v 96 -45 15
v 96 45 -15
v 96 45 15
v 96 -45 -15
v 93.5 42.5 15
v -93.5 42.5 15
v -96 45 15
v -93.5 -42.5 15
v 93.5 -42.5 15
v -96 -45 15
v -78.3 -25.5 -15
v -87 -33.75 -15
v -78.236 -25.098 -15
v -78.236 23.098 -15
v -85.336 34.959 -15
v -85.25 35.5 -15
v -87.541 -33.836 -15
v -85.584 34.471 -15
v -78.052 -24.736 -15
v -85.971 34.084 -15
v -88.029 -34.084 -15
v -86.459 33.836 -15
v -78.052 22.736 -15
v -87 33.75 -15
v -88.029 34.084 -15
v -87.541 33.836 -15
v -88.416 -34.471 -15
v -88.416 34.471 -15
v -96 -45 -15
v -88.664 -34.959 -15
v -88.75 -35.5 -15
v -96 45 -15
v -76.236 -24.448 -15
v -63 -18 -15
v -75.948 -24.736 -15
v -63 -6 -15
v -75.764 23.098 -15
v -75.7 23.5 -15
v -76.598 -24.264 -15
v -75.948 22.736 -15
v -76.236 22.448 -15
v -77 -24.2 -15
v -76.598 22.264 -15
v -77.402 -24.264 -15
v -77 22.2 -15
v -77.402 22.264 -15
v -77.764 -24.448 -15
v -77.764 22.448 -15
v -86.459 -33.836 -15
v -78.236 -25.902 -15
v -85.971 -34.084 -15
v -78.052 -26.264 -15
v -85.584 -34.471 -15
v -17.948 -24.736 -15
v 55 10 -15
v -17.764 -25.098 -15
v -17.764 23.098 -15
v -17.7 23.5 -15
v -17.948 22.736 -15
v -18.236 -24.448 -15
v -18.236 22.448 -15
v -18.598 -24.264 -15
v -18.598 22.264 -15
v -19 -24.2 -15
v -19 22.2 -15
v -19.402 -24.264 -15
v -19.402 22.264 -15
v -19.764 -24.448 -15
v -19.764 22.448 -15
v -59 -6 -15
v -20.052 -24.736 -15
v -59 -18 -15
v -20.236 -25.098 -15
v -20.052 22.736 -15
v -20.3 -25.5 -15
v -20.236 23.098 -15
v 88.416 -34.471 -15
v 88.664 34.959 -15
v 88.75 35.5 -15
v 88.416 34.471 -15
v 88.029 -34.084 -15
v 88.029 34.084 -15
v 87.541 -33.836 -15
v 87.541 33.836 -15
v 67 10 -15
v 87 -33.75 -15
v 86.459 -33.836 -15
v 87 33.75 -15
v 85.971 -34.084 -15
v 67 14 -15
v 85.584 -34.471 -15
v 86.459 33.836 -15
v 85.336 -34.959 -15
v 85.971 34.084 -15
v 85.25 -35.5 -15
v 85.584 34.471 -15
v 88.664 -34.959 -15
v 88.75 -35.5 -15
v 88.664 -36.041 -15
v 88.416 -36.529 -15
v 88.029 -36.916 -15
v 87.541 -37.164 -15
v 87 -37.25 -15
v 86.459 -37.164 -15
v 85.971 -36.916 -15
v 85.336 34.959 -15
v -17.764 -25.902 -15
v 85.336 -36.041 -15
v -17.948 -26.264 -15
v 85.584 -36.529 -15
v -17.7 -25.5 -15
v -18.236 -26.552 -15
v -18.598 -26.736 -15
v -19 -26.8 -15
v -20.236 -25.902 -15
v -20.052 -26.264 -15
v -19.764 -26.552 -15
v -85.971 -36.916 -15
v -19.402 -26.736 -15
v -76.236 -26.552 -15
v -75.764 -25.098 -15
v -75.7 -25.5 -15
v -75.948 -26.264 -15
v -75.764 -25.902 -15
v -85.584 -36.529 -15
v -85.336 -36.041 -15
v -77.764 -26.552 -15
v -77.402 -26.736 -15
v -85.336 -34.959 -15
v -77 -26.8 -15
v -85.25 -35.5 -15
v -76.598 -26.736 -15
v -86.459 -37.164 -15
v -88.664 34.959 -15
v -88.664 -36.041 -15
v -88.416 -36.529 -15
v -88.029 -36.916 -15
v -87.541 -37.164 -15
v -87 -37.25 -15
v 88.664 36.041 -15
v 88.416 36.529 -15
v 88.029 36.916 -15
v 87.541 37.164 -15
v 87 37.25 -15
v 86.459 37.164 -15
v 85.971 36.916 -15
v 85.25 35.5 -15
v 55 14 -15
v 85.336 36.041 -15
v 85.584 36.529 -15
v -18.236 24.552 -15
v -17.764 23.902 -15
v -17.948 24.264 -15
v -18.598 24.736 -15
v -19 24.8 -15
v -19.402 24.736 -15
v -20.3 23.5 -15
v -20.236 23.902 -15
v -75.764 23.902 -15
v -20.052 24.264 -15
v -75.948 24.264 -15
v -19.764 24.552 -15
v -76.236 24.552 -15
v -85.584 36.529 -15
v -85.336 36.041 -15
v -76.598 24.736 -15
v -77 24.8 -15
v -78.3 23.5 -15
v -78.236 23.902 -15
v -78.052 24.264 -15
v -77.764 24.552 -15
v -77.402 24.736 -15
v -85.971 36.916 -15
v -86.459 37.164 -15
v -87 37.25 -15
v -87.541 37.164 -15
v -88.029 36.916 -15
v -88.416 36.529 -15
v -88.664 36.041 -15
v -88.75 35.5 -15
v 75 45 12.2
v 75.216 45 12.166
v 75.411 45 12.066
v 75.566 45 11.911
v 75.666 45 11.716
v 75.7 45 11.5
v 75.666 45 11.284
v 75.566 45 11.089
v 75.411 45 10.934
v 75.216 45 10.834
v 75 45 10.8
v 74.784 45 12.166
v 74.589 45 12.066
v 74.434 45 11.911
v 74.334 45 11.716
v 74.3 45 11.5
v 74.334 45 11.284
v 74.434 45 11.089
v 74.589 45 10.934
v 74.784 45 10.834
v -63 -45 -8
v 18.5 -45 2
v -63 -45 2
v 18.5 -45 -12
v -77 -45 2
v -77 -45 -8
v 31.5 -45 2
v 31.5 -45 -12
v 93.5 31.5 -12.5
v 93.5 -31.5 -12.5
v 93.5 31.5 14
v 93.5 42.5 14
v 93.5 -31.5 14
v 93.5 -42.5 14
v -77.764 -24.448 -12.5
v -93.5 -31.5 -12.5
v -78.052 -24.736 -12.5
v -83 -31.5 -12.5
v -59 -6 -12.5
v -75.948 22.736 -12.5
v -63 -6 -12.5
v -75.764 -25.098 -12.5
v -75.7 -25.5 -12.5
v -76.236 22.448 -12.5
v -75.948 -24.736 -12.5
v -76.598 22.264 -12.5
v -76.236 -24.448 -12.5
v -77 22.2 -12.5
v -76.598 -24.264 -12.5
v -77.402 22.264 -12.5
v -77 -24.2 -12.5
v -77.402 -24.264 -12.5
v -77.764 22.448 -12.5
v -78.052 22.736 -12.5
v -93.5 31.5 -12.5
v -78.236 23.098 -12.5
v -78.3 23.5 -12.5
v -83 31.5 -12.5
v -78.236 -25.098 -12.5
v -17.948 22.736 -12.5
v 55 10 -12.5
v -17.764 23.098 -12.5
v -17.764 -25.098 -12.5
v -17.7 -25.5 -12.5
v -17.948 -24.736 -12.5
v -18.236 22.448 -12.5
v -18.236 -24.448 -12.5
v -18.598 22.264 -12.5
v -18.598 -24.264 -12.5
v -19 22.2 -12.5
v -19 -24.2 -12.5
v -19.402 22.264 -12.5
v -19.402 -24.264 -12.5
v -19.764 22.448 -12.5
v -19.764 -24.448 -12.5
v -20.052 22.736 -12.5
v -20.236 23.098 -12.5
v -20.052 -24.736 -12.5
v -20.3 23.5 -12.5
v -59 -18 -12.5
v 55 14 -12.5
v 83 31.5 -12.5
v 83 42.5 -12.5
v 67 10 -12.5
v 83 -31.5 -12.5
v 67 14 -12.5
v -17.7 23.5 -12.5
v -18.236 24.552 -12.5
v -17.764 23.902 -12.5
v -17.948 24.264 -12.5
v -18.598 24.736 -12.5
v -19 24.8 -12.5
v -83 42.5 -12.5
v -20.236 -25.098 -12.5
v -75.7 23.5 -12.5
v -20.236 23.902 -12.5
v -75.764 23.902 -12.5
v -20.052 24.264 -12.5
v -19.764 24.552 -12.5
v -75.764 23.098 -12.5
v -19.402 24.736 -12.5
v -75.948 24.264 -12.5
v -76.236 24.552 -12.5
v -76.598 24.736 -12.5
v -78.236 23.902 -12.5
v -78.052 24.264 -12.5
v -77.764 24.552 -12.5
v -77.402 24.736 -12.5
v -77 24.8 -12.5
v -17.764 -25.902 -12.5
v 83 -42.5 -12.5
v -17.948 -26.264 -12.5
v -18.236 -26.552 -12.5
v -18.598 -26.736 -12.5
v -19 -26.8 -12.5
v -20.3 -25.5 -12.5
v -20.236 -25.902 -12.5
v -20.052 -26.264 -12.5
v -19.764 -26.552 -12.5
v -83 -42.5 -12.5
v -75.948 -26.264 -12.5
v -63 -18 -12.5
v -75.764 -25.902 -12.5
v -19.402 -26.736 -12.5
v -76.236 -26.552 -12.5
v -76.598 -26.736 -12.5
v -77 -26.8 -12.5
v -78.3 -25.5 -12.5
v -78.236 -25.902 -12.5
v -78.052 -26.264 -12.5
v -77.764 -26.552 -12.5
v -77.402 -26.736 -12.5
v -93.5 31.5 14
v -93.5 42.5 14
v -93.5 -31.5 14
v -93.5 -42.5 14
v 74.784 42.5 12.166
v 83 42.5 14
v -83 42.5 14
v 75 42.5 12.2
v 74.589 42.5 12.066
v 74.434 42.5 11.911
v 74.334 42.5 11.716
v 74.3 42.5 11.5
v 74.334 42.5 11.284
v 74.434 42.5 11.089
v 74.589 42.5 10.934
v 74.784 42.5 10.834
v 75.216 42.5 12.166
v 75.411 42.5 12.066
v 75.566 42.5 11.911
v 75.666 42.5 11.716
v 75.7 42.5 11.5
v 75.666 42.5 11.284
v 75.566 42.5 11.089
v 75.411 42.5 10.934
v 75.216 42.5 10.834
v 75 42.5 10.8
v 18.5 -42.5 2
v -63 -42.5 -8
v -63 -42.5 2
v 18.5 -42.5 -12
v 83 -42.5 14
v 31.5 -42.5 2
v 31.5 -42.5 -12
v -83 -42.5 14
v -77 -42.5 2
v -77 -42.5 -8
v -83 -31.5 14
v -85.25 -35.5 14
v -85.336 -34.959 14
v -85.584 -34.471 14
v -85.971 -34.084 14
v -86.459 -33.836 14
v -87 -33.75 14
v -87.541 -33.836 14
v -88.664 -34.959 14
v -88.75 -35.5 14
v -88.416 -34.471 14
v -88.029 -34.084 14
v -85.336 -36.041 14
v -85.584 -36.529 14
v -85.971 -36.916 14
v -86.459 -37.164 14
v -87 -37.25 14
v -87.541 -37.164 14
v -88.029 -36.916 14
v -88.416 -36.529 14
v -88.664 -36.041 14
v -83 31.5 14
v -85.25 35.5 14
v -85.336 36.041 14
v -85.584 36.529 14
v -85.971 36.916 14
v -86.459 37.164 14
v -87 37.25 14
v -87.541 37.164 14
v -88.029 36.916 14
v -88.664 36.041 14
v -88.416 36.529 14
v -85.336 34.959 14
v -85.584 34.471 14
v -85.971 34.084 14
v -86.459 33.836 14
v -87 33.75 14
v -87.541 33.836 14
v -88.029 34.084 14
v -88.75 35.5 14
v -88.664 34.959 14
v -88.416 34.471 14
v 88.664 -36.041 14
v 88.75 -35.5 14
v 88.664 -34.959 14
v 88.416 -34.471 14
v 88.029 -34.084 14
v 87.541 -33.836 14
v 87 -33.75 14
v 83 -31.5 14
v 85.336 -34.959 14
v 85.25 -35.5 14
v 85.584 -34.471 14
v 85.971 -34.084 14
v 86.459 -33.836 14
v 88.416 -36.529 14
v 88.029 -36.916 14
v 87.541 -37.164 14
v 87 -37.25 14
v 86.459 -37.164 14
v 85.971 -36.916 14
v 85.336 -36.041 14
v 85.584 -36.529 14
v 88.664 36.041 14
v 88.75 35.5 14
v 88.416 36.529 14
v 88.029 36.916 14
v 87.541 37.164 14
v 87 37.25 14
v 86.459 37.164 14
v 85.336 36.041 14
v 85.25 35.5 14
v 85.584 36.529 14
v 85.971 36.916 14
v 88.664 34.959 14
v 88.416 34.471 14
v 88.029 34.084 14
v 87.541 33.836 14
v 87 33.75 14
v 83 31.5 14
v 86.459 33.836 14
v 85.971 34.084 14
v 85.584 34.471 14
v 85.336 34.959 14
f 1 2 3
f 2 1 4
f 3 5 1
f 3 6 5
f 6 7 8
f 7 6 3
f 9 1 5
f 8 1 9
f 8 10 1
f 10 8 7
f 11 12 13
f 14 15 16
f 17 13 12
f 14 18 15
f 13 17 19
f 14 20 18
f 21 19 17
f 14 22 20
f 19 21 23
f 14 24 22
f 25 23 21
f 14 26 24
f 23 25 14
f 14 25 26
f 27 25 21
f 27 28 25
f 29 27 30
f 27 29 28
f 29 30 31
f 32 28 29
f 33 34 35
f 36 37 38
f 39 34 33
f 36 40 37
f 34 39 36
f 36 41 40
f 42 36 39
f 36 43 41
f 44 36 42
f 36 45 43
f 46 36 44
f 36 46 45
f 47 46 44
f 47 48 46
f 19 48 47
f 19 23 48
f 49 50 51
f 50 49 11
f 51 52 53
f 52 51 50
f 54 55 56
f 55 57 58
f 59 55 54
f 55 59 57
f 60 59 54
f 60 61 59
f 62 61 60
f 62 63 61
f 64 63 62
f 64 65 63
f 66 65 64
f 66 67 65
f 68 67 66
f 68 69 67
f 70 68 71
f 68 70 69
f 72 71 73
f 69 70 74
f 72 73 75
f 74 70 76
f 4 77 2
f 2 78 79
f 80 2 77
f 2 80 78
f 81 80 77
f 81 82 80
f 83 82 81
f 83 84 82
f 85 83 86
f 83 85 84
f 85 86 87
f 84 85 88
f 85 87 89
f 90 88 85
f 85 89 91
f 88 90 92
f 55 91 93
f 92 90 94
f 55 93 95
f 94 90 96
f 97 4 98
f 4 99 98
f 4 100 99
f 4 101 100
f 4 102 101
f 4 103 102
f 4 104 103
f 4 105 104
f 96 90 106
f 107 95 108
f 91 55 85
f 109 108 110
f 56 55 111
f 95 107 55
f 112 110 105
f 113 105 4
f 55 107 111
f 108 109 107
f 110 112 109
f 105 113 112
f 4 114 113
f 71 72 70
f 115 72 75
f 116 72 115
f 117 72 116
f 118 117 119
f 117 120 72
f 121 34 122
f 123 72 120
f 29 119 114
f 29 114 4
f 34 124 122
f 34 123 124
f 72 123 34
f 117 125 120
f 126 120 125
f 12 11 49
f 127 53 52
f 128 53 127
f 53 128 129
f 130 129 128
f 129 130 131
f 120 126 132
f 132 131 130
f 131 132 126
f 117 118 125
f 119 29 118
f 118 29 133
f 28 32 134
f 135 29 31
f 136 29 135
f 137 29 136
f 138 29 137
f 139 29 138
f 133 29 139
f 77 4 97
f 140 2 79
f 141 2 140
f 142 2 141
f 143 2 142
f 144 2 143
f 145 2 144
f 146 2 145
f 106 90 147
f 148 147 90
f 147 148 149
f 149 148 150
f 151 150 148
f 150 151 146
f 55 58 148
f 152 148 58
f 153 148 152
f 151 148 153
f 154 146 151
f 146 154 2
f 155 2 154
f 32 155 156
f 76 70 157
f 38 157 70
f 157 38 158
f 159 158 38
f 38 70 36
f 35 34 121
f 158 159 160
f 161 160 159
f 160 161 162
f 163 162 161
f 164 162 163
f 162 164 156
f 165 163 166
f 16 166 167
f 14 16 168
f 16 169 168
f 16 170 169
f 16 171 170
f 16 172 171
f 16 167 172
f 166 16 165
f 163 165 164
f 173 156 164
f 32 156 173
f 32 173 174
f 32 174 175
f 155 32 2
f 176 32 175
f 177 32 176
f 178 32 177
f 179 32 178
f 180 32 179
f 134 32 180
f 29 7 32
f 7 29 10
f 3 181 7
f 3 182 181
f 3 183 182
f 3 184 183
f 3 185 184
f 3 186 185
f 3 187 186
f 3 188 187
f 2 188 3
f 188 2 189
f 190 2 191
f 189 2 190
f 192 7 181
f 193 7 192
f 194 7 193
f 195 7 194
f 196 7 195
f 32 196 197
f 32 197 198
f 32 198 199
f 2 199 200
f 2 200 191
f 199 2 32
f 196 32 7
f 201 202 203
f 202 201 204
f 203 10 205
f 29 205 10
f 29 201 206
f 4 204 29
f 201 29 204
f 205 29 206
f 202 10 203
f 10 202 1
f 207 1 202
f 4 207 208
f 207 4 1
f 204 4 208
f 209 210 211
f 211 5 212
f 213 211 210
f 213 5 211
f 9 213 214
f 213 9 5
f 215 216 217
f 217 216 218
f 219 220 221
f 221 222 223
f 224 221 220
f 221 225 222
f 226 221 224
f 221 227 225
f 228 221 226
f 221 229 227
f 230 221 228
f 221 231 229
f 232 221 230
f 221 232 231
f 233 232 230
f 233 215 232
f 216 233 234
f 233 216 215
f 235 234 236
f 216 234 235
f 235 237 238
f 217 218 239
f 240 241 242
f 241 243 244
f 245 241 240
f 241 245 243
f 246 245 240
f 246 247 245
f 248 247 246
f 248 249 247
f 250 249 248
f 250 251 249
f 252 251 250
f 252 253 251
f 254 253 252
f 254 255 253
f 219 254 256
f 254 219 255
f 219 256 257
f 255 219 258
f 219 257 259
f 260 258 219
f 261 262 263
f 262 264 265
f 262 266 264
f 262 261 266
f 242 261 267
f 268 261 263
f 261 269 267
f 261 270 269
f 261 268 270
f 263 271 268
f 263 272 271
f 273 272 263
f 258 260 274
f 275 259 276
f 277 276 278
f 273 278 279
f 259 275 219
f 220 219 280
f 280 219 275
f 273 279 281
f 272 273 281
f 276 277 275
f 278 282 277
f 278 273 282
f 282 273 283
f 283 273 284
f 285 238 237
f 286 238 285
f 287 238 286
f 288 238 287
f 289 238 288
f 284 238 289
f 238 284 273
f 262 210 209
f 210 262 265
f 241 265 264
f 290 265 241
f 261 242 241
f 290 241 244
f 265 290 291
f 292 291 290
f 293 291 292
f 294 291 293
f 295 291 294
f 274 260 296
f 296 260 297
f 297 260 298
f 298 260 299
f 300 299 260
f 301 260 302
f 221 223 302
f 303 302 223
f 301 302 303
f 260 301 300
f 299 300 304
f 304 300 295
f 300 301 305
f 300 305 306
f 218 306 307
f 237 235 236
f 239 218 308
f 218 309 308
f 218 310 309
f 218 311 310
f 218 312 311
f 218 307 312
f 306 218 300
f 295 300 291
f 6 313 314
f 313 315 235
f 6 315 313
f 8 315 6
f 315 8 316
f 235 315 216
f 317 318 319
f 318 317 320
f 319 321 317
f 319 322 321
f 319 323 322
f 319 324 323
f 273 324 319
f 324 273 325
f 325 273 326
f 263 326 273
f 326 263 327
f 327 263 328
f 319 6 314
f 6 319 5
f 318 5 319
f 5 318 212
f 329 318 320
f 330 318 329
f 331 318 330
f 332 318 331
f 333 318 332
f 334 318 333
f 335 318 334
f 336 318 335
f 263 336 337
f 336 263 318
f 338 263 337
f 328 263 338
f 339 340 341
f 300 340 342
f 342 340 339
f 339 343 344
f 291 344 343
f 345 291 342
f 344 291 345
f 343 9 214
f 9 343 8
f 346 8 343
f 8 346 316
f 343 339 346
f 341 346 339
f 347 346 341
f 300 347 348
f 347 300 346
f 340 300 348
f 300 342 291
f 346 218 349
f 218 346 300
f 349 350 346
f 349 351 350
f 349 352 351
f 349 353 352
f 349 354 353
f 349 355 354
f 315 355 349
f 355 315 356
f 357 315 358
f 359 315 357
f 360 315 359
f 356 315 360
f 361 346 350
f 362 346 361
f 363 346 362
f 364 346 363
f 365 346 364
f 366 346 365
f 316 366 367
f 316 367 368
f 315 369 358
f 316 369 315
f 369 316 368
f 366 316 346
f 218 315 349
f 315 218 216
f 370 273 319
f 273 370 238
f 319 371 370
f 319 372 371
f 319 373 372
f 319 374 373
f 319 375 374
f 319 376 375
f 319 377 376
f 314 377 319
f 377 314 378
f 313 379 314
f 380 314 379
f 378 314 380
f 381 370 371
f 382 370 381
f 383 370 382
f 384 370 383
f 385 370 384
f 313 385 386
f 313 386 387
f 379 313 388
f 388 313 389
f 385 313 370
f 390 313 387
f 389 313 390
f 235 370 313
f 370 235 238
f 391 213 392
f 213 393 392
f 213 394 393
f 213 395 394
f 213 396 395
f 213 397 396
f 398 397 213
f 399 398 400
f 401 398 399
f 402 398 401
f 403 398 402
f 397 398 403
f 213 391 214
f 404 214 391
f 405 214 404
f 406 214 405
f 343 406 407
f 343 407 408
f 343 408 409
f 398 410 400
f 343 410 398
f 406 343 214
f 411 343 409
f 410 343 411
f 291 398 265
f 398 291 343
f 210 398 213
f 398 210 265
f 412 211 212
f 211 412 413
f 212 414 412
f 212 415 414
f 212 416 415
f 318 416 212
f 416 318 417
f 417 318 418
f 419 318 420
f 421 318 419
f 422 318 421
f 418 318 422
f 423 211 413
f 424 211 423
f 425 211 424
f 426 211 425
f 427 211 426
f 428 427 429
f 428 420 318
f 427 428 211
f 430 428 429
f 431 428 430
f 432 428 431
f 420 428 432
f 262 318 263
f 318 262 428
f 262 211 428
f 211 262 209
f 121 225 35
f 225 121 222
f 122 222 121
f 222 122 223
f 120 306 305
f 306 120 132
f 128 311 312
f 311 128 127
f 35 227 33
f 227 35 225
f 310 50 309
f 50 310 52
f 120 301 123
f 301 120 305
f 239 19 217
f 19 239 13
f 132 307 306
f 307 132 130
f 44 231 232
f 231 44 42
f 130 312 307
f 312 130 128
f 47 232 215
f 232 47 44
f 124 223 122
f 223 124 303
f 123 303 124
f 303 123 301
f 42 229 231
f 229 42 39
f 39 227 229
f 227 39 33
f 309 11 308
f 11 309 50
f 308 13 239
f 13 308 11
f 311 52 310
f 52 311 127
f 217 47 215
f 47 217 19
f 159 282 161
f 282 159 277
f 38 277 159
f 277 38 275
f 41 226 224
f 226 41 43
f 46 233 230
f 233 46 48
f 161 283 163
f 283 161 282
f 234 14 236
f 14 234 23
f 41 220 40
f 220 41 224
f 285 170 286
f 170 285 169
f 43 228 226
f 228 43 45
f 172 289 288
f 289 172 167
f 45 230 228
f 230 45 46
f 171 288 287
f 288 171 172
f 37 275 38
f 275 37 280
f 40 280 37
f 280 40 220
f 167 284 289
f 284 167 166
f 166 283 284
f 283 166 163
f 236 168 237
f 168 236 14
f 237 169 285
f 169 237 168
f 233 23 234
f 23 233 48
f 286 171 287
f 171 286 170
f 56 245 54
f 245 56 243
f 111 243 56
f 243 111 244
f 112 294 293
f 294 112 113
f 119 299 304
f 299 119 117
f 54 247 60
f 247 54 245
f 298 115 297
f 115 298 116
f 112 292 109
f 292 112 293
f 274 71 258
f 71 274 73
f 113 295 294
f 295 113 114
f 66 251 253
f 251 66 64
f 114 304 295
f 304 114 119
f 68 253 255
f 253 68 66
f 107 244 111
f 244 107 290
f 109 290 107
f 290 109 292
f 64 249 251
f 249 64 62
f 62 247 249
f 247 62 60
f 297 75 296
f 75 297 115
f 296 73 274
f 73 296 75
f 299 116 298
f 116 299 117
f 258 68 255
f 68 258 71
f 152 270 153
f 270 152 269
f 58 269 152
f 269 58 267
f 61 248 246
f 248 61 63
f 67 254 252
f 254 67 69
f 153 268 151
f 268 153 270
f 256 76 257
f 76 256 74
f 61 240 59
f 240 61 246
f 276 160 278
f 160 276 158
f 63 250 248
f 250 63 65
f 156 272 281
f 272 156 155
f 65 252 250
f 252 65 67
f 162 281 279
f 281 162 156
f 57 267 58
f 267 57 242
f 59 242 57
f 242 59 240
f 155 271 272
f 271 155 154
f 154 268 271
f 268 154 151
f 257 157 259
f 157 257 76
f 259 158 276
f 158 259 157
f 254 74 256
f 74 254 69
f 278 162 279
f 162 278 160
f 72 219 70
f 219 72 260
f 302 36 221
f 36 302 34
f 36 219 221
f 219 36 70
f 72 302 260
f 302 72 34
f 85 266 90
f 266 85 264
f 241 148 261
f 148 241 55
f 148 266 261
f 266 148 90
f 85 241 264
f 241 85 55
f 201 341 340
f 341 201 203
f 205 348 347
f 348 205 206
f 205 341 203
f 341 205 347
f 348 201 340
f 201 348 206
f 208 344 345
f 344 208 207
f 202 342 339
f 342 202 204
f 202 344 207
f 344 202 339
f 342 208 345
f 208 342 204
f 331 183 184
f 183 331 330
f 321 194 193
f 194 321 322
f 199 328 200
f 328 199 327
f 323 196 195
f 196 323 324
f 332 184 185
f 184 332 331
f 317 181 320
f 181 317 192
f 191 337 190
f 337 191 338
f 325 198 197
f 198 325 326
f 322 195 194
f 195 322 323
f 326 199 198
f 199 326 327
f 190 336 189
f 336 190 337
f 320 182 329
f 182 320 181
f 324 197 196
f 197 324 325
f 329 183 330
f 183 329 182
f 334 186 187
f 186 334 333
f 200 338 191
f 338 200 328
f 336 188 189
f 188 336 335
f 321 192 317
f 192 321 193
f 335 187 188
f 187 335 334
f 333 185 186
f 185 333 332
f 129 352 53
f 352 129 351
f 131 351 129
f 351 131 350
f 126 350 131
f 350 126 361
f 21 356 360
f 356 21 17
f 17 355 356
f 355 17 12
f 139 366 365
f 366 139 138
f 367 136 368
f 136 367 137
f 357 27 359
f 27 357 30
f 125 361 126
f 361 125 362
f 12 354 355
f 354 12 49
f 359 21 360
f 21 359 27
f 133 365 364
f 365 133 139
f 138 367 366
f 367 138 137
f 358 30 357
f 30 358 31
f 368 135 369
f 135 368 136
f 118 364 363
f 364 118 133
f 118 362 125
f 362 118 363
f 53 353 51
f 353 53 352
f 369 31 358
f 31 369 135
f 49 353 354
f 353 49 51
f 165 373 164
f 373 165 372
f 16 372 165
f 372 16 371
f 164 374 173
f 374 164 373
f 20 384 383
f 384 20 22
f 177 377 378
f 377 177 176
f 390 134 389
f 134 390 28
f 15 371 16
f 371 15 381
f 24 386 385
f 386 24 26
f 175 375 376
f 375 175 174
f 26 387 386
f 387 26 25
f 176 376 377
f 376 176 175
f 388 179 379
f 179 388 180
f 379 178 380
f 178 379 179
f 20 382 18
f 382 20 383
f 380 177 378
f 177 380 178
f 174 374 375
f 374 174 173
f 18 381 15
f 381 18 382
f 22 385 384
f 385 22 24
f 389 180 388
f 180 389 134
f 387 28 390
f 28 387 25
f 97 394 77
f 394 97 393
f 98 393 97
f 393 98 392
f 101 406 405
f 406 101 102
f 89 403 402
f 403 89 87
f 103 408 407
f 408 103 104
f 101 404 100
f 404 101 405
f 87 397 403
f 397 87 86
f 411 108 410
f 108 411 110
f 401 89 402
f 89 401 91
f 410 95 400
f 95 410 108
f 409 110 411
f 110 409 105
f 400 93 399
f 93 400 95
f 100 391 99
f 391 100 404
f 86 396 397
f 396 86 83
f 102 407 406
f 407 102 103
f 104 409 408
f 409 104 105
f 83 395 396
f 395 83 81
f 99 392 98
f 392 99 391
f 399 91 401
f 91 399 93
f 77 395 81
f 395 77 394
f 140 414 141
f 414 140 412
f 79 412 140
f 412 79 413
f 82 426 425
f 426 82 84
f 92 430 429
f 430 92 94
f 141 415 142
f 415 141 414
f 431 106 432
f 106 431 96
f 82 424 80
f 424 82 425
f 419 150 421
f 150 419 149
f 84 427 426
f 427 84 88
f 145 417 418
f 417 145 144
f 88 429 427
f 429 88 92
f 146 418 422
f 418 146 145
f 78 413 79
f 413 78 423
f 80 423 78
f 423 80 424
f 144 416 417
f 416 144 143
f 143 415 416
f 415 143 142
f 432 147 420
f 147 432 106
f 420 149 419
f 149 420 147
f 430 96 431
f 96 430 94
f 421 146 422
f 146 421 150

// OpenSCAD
Case(box=[192,90,30], wall=2.5, screws=3.5/2, countersink=false);


module Holes(box, wall)
{
   union()
	{

// Each pattern is looking at each face; RH XY coordinates; bottom left corner = (0,0)
// except the base, which is looking from on-top/inside.

// Base

	translate([0,0,-box.z/2]) 
	translate([-box.x/2,-box.y/2,0])
	{
		translate([15+4, 15.5+4, 0])
			cylinder(r=1.3, h=4*wall, center=true, $fn=20);
		translate([15+4, 15.5+4+49, 0])
			cylinder(r=1.3, h=4*wall, center=true, $fn=20);
		translate([15+4+58, 15.5+4, 0])
			cylinder(r=1.3, h=4*wall, center=true, $fn=20);
		translate([15+4+58, 15.5+4+49, 0])
			cylinder(r=1.3, h=4*wall, center=true, $fn=20);

		translate([35, 33, 0])
			cube([4,12,4*wall], center=true);
		translate([box.x-35, box.y-33, 0])
			cube([12,4,4*wall], center=true);	
	}

// Low X face

	translate([-box.x/2,0,0])rotate([0,-90,0])rotate([0,0,-90])translate([-box.y/2, -box.z/2, 0])
	{
		//translate([15, 15, 0])
		//	cylinder(r=2, h=4*wall, center=true);

	}

// High X face

	translate([box.x/2,0,0])rotate([0,90,0])rotate([0,0,90])translate([-box.y/2, -box.z/2, 0])
	{
		//translate([15, 19, 0])
		//	cube([4,15,4*wall], center=true);

	}

// Low Y face

	translate([0,-box.y/2,0])rotate([90,0,0])translate([-box.x/2, -box.z/2, 0])
	{
		translate([15+4+7, 12, 0])
			cube([14,10,4*wall], center=true);
		translate([15+4+102, 10, 0])
			cube([13,14,4*wall], center=true);
	}



// High Y face

	translate([0,box.y/2,0])rotate([-90,0,0])rotate([0,0,180])translate([-box.x/2, -box.z/2, 0])
	{
		translate([box.x-(15+4+152), 24+wall, 0])
			cylinder(r=0.7, h=4*wall, center=true, $fn=20);		

	}

	}

}

module Corners(box, rad, solid, countersink)
{
	xcen = box.x-18;
	ycen = box.y-19;

	for(x=[-1,1])for(y=[-1,1])
		translate([x*xcen/2,y*ycen/2,0])
		{
			if(solid)
			{
				translate([2*x,2*y,0])
					cube([12,12,box.z-2], center=true);
			} else
			{
				cylinder(r=rad, h=box.z*3, center=true, $fn=20);
				if(countersink)
				{
					translate([0,0,-box.z/2+0.8])
						cylinder(r1=2.3*rad, r2=rad, h=2.5, center=true, $fn=20);
				}
			}
		}
}

module Case(box=[60,40,30], wall=2.5, screws=1.75, countersink=false)
{
	difference()
	{
		union()
		{
			difference()
			{
				cube(box, center=true);
				translate([0,0,wall])
					cube([box.x-2*wall, box.y-2*wall, box.z], center=true);
			}
			Corners(box, screws, true, countersink);
		}
		Holes(box, wall);
		Corners(box, screws, false, countersink);
	}

}
